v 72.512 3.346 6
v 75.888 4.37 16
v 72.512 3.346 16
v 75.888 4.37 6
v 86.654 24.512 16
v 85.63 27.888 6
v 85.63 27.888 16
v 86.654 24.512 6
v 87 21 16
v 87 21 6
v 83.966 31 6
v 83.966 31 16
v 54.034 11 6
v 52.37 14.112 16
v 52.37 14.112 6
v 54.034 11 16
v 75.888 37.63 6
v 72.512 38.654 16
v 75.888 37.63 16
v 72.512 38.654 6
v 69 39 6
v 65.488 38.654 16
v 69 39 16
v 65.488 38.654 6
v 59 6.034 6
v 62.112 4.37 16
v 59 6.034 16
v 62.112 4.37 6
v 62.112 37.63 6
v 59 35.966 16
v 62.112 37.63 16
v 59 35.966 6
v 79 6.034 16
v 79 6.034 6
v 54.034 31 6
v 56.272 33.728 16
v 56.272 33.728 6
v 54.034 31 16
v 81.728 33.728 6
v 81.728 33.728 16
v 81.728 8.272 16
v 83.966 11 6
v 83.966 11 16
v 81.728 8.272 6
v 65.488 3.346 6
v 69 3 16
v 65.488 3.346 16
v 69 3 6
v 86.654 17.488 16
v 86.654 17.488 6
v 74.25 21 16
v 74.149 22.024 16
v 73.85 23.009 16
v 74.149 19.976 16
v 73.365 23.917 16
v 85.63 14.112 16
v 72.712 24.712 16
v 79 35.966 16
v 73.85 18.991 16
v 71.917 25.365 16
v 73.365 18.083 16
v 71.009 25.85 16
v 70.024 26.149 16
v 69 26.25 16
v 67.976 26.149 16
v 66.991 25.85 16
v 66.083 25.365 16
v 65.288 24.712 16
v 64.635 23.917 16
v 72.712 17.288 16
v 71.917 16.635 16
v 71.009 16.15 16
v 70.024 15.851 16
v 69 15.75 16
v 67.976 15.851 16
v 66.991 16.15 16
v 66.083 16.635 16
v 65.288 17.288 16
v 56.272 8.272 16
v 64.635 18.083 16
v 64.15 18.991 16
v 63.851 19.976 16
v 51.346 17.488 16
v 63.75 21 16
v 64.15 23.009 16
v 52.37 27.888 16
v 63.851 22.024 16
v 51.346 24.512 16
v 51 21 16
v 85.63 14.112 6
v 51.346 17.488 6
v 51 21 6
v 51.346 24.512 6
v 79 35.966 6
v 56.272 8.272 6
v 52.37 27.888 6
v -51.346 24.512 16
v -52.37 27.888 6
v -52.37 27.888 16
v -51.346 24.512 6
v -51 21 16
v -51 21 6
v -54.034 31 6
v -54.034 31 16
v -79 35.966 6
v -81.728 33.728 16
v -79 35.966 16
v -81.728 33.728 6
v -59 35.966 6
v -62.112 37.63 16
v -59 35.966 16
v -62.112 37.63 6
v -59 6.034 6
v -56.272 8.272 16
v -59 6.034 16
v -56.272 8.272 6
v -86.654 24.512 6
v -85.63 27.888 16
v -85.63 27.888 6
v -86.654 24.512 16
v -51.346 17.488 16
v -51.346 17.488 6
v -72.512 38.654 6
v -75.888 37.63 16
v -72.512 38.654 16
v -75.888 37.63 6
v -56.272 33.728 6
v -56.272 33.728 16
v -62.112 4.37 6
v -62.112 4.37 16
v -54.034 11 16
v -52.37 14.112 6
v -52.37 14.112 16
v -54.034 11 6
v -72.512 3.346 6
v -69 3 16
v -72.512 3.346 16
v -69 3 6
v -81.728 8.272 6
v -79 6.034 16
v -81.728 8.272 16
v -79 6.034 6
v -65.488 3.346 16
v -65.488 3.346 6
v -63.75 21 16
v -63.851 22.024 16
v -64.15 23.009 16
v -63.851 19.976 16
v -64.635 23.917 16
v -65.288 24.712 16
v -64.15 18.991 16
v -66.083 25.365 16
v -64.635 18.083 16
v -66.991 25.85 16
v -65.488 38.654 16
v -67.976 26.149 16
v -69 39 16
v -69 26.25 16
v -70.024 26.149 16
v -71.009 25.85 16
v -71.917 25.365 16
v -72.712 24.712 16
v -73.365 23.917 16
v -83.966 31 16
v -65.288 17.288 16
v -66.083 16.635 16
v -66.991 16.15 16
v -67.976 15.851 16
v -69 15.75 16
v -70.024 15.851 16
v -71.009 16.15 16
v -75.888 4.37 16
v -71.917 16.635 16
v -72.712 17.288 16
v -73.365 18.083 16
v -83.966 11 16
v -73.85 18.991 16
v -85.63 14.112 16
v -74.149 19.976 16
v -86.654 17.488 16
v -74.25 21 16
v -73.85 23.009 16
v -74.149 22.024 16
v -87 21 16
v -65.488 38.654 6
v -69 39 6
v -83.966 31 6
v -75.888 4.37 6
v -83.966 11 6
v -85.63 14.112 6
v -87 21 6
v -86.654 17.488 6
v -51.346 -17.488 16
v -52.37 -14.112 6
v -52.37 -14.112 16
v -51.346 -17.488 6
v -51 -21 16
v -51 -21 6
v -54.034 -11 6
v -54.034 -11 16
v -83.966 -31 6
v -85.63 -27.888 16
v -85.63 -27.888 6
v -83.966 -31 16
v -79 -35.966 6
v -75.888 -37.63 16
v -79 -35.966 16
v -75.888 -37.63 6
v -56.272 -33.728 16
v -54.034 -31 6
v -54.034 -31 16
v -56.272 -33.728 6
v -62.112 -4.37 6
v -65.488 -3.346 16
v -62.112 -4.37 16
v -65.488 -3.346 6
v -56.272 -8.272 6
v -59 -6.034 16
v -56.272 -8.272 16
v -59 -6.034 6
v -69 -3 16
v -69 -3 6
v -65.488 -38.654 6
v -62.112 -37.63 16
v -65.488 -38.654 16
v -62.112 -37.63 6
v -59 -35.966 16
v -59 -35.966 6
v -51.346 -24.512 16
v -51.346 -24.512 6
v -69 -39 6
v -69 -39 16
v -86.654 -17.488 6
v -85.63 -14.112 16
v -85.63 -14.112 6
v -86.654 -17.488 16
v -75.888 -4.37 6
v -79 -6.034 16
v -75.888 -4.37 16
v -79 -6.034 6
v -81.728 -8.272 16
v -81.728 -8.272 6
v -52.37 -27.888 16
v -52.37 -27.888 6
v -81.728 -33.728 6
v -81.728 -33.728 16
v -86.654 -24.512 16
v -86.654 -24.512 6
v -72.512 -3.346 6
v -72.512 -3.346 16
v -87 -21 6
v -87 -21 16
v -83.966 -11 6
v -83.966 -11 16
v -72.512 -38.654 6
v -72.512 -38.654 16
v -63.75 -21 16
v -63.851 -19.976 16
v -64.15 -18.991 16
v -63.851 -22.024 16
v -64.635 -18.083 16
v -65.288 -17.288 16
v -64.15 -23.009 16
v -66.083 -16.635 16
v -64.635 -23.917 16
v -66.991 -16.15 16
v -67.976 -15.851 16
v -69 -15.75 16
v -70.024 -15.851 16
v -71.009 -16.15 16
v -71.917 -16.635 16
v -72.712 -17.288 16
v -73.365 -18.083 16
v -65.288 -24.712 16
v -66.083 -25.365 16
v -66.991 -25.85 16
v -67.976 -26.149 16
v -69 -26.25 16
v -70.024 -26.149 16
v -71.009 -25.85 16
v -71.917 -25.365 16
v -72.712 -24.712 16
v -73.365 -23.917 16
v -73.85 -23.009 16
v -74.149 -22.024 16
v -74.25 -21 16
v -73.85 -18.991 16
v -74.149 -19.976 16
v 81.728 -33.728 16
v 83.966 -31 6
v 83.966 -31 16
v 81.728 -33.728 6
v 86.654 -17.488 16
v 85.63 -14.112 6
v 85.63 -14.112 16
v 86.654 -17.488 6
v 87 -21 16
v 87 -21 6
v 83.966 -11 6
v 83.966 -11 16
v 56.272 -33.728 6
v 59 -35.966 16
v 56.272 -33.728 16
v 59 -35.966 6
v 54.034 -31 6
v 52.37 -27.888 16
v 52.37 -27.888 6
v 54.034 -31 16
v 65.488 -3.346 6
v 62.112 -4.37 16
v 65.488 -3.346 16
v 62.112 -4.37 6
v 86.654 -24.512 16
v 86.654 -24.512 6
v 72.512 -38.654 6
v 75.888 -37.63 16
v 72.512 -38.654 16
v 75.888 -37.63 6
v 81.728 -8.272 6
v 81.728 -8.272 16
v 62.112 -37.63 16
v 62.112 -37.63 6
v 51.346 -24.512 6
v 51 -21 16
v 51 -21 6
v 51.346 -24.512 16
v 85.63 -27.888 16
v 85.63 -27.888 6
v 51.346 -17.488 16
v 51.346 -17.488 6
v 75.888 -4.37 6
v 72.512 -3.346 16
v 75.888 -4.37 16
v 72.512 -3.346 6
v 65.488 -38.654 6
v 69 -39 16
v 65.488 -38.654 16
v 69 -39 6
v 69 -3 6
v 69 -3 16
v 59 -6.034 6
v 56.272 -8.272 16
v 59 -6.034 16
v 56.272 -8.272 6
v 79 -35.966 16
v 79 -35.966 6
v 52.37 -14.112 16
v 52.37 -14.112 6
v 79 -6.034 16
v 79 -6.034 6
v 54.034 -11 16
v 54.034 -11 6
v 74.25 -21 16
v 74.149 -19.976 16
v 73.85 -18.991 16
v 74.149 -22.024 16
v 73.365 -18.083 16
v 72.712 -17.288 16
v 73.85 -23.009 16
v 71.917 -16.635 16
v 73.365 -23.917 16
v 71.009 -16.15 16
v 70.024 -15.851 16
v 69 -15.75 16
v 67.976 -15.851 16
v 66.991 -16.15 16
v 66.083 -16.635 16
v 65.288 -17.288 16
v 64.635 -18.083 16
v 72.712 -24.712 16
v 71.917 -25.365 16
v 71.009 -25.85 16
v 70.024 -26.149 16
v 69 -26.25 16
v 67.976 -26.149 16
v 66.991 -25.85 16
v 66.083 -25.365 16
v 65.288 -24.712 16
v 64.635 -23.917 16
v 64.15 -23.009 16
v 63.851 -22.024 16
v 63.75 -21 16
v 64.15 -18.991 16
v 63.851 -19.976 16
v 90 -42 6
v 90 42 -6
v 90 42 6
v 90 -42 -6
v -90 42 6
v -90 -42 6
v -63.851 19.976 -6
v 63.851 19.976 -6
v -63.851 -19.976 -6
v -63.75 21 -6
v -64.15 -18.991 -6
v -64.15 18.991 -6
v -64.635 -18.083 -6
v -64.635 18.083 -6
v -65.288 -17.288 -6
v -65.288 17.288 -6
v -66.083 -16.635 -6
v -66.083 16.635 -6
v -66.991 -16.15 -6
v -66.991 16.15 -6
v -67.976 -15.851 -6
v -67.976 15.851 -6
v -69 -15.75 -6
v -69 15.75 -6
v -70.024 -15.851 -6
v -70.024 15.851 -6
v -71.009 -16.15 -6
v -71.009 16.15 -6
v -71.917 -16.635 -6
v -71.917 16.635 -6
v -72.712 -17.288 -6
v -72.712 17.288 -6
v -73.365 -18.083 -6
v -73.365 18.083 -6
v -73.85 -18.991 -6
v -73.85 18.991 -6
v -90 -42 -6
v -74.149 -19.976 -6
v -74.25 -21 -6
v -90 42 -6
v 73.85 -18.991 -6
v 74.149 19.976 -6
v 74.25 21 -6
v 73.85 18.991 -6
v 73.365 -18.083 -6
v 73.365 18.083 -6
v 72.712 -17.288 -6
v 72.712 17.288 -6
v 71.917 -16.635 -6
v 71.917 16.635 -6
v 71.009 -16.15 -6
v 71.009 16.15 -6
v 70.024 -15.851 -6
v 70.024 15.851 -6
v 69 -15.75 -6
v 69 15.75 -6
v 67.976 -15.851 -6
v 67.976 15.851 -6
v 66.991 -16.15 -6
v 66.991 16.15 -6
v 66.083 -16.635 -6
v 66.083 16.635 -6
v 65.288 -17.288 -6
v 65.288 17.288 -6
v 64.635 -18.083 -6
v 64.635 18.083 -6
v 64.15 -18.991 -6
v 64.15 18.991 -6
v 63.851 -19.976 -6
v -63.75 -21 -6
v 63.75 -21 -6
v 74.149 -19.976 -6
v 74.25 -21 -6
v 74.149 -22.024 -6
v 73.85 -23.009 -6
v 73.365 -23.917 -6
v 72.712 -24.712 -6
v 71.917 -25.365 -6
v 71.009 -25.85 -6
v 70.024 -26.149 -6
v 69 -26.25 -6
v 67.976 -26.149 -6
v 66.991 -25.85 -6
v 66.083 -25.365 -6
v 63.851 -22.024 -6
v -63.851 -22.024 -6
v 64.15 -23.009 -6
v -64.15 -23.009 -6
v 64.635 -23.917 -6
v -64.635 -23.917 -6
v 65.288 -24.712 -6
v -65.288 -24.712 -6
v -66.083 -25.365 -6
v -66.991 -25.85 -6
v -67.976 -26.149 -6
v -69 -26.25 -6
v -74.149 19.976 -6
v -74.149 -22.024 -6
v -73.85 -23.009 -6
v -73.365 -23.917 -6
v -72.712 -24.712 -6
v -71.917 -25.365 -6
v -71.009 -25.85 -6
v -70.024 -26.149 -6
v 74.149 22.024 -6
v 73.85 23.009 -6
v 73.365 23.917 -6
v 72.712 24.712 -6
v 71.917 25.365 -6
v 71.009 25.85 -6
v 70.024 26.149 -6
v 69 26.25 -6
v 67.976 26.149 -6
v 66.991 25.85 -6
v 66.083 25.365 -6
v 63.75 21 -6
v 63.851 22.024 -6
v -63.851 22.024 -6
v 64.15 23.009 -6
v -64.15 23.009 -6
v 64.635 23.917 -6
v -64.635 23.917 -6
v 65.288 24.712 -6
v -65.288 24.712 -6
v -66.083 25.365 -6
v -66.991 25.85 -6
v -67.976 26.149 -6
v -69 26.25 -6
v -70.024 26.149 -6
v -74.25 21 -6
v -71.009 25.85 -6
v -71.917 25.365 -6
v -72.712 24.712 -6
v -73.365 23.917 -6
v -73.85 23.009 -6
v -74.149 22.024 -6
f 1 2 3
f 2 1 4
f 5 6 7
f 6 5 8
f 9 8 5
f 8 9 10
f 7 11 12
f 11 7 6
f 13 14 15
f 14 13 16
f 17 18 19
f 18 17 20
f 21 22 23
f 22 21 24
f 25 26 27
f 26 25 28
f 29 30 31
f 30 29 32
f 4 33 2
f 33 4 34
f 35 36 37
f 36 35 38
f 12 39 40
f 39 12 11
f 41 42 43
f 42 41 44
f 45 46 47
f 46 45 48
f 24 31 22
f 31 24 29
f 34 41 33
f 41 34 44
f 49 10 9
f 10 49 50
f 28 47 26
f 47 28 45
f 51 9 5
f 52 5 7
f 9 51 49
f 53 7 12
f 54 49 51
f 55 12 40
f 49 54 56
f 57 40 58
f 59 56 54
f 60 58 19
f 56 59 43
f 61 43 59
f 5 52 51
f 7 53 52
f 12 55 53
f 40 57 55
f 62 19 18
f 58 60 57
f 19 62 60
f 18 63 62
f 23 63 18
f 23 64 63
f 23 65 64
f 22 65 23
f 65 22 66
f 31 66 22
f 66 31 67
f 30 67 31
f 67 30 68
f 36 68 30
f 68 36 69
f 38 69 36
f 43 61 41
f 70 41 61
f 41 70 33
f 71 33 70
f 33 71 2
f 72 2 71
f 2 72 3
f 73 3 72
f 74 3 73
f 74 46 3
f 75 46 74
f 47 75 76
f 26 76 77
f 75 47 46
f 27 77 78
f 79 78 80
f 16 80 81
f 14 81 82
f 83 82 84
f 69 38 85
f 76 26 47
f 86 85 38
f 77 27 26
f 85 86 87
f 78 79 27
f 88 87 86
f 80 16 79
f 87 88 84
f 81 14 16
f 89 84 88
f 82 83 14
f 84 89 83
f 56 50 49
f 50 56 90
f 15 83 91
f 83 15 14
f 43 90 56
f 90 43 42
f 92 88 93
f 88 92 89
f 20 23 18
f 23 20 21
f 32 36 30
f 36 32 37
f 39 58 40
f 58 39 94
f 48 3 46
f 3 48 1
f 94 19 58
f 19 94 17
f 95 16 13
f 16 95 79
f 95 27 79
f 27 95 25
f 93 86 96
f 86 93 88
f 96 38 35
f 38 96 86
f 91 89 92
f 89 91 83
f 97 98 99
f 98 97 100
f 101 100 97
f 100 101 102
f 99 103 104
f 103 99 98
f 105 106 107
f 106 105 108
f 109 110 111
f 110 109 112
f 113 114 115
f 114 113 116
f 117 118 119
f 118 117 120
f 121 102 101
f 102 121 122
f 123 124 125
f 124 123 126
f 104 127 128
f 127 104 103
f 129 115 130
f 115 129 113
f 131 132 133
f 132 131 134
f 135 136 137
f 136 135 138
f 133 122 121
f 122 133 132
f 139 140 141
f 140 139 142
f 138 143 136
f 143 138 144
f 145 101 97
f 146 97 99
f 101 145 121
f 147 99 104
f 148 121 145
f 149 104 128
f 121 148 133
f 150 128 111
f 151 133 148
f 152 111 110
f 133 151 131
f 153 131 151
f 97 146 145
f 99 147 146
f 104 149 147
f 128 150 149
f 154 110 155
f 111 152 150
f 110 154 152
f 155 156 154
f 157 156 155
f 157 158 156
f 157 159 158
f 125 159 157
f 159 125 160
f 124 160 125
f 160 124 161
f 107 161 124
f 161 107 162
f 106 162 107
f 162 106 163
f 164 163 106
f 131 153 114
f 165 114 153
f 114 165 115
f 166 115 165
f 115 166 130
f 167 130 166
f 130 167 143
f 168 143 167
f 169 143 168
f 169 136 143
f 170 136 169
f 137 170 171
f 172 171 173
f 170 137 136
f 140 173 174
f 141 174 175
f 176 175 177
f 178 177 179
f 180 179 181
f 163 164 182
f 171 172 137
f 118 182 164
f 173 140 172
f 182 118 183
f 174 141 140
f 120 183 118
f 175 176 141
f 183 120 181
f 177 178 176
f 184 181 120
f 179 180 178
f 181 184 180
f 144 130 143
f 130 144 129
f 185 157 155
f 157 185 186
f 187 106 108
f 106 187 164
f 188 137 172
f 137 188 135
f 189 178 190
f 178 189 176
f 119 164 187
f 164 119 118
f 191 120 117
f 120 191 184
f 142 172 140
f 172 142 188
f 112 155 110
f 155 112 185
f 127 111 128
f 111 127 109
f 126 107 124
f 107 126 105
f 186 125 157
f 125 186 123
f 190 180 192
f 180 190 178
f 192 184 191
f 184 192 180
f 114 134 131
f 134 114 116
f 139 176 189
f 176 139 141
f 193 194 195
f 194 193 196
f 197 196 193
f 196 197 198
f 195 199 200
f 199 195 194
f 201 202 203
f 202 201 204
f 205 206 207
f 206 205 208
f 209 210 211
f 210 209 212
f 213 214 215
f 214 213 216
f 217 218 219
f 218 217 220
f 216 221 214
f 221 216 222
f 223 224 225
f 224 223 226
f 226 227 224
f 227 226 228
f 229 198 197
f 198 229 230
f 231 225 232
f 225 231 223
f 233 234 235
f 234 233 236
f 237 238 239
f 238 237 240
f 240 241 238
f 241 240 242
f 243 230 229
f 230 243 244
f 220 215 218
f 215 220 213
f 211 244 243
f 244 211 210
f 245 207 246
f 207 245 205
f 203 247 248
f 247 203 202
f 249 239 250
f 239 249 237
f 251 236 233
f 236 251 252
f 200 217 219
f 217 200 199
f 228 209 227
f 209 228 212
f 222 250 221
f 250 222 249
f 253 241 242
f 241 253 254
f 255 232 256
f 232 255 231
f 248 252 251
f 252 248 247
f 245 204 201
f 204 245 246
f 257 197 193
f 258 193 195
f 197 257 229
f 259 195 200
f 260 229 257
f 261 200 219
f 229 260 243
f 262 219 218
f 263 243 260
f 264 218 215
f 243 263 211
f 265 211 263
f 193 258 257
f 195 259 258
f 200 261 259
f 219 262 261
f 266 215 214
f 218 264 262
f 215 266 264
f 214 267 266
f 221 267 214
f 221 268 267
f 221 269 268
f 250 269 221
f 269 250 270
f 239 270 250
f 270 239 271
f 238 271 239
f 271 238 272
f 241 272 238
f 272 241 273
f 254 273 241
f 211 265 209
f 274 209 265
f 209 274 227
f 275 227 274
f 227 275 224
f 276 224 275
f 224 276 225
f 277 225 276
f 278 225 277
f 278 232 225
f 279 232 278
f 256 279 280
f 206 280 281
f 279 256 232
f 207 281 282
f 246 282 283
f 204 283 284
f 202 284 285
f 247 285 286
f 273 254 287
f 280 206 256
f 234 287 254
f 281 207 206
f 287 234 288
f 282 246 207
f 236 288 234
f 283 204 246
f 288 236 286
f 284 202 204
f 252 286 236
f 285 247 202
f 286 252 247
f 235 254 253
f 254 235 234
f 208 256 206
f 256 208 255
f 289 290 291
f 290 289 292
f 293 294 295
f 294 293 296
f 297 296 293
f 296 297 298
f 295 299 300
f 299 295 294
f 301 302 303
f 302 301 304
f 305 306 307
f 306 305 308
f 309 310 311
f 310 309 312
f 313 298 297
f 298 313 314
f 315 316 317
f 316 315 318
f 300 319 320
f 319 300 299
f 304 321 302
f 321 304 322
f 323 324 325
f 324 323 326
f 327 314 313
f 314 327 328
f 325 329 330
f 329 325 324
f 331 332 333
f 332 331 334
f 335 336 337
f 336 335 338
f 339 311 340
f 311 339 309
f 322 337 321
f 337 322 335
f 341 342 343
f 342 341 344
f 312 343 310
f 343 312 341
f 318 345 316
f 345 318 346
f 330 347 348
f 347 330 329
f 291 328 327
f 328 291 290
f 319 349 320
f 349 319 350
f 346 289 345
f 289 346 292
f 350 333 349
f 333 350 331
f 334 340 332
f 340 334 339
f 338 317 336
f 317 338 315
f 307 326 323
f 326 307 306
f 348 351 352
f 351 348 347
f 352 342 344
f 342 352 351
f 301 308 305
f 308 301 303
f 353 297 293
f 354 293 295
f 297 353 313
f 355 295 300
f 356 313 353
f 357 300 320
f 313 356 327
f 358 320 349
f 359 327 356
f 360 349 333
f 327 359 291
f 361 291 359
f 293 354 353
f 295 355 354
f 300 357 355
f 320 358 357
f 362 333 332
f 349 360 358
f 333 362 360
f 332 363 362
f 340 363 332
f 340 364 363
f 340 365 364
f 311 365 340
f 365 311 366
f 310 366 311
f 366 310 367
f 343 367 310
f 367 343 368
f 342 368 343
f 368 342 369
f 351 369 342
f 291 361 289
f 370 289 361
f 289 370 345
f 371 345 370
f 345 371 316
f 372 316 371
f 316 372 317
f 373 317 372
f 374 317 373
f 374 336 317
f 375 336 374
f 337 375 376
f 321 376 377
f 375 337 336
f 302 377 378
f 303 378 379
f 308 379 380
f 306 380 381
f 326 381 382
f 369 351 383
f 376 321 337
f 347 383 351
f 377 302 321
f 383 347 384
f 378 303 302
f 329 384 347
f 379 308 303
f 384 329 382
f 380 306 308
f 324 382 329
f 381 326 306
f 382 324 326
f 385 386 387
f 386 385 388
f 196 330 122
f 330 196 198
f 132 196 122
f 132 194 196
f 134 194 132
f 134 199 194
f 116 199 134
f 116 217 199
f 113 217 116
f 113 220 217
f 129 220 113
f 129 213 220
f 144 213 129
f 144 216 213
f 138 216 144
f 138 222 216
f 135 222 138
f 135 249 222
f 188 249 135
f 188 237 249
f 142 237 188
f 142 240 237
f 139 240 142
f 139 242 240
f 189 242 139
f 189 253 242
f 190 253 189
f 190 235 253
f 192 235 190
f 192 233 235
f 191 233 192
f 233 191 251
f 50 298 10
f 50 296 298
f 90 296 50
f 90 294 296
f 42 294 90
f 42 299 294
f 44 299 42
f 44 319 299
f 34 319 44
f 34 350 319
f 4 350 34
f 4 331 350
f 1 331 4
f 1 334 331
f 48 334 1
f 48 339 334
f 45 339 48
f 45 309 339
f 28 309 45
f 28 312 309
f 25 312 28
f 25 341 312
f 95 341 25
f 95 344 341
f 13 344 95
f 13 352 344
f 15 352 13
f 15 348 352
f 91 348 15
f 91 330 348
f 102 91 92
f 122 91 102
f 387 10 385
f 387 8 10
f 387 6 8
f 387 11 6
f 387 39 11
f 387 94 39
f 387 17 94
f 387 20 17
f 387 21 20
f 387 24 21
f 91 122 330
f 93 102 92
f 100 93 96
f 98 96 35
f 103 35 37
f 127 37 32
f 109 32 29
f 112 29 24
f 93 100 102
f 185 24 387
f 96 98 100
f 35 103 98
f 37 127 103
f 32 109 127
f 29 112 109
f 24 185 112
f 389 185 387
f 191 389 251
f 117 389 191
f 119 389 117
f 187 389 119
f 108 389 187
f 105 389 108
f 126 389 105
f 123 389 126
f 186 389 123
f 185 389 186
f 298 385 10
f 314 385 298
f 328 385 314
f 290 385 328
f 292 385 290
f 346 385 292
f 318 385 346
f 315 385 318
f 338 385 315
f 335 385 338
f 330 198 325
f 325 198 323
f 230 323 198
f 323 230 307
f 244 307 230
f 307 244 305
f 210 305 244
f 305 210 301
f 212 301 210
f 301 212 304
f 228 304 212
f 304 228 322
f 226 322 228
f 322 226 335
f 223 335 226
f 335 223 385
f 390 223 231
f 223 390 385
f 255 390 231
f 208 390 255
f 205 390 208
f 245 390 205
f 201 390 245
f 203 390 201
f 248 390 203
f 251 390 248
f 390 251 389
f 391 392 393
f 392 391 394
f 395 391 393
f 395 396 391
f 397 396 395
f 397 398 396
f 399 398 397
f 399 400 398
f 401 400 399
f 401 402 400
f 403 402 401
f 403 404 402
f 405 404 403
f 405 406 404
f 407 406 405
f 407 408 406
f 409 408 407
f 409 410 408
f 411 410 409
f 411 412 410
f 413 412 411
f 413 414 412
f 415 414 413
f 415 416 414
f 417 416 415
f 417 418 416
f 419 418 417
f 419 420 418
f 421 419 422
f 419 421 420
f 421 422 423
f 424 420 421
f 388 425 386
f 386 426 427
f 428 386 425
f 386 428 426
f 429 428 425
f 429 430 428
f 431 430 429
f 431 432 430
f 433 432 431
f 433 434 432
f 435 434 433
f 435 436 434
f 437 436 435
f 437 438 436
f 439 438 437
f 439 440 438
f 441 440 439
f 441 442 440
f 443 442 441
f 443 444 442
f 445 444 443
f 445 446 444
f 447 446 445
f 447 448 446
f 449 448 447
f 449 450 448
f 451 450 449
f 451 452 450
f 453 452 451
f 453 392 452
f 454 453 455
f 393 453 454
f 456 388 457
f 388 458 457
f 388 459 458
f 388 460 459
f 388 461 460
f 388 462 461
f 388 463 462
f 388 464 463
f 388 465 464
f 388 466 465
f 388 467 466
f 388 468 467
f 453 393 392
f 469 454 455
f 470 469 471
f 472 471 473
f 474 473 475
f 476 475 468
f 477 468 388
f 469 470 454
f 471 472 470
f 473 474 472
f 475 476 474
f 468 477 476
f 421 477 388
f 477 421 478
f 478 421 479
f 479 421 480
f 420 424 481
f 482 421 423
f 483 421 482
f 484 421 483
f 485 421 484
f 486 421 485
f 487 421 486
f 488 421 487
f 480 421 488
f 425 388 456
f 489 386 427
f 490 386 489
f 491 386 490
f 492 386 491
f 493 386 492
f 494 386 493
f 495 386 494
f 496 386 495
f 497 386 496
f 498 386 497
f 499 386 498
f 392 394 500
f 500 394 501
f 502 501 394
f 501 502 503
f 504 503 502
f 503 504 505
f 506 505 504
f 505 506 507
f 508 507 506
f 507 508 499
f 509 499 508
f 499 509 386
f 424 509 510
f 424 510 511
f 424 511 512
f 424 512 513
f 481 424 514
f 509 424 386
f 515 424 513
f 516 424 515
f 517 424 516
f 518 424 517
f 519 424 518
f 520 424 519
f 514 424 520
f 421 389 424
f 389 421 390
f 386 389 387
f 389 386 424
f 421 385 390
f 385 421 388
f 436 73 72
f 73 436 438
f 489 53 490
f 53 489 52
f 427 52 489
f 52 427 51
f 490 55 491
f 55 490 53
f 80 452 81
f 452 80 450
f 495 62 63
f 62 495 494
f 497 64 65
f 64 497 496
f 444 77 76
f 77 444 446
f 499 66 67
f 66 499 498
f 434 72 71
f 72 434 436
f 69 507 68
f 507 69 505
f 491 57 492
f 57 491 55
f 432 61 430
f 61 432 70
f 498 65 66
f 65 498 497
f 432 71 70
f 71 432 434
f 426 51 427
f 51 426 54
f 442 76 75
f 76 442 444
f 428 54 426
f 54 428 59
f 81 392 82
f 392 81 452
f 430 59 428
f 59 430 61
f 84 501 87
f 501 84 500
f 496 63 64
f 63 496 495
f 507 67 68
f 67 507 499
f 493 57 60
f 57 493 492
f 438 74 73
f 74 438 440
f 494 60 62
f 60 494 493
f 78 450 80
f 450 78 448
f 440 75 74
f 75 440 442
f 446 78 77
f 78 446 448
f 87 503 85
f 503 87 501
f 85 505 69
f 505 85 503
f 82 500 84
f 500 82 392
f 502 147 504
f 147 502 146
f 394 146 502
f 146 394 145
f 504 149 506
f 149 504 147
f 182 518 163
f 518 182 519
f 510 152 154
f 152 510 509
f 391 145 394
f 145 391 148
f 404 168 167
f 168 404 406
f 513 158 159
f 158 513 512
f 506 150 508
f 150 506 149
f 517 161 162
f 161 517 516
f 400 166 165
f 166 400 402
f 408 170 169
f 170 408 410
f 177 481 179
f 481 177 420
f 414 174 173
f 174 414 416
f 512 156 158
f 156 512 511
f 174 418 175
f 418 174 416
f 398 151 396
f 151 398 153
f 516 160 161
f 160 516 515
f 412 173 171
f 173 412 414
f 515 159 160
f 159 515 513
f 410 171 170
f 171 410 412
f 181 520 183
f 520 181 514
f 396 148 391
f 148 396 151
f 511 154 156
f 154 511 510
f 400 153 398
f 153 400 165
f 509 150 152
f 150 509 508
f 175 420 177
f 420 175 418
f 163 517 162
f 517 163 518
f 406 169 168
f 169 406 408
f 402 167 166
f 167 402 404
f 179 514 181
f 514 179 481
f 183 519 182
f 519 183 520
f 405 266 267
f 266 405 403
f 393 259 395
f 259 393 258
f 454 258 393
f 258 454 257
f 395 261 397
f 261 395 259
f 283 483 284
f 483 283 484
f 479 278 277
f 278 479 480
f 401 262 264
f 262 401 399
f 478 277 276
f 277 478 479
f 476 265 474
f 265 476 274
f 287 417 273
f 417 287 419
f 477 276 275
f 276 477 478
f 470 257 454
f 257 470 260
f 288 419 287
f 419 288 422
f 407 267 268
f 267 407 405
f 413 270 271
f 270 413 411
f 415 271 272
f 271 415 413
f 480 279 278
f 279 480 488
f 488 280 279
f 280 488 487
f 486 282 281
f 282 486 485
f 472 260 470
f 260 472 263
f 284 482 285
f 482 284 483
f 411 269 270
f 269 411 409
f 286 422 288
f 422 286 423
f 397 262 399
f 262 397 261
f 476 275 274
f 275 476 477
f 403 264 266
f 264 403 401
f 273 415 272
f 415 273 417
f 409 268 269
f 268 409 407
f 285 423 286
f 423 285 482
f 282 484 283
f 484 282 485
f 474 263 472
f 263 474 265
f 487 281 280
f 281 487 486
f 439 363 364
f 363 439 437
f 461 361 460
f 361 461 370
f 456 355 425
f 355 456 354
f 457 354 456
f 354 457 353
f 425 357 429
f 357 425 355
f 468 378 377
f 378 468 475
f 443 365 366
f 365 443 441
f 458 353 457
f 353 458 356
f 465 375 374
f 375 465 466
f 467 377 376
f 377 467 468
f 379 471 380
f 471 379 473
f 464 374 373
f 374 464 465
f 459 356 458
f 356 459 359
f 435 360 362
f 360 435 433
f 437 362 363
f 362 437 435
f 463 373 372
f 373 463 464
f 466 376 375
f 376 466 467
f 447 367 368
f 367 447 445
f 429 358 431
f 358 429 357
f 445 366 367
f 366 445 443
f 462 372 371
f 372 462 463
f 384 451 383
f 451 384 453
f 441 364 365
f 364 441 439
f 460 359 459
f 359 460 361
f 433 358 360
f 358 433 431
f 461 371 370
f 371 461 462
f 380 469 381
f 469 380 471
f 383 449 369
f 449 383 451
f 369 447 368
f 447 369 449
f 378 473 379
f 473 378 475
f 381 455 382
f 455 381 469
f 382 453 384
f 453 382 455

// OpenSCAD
$fn = 32;

// ----------------------------------------------------------------------
// Anchor pads 180 x 84 x 22
// four corner bosses with anchor holes
// ----------------------------------------------------------------------

// --- parameters (mm) ---
plate = [180, 84, 12];  // base plate size (x, y, z)
pads = 4;               // boss count, one per corner
edge = 21;              // boss centre offset from the plate edge
boss_d = 36;            // boss diameter
boss_h = 10;            // boss height above the base plate
hole_d = 10.5;          // hole diameter

// --- derived feature positions (mm) ---
height = plate[2] + boss_h;      // = 22   overall height of the part
corner_x = plate[0] / 2 - edge;  // = 69   boss centre X
corner_y = plate[1] / 2 - edge;  // = 21   boss centre Y
feature_centers = [
  [corner_x, corner_y],
  [-corner_x, corner_y],
  [-corner_x, -corner_y],
  [corner_x, -corner_y]
];   // boss centres, anchor holes are drilled there

// base plate, four bosses standing on it, anchor holes all the way through
difference() {
  union() {
    cube(plate, center = true);
    for (centre = feature_centers)
      translate([centre[0], centre[1], plate[2] / 2 - 1])
        cylinder(d = boss_d, h = boss_h + 1);
  }
  for (centre = feature_centers)
    translate([centre[0], centre[1], -height])
      cylinder(d = hole_d, h = 2 * height + 2);  // through boss and plate
}
